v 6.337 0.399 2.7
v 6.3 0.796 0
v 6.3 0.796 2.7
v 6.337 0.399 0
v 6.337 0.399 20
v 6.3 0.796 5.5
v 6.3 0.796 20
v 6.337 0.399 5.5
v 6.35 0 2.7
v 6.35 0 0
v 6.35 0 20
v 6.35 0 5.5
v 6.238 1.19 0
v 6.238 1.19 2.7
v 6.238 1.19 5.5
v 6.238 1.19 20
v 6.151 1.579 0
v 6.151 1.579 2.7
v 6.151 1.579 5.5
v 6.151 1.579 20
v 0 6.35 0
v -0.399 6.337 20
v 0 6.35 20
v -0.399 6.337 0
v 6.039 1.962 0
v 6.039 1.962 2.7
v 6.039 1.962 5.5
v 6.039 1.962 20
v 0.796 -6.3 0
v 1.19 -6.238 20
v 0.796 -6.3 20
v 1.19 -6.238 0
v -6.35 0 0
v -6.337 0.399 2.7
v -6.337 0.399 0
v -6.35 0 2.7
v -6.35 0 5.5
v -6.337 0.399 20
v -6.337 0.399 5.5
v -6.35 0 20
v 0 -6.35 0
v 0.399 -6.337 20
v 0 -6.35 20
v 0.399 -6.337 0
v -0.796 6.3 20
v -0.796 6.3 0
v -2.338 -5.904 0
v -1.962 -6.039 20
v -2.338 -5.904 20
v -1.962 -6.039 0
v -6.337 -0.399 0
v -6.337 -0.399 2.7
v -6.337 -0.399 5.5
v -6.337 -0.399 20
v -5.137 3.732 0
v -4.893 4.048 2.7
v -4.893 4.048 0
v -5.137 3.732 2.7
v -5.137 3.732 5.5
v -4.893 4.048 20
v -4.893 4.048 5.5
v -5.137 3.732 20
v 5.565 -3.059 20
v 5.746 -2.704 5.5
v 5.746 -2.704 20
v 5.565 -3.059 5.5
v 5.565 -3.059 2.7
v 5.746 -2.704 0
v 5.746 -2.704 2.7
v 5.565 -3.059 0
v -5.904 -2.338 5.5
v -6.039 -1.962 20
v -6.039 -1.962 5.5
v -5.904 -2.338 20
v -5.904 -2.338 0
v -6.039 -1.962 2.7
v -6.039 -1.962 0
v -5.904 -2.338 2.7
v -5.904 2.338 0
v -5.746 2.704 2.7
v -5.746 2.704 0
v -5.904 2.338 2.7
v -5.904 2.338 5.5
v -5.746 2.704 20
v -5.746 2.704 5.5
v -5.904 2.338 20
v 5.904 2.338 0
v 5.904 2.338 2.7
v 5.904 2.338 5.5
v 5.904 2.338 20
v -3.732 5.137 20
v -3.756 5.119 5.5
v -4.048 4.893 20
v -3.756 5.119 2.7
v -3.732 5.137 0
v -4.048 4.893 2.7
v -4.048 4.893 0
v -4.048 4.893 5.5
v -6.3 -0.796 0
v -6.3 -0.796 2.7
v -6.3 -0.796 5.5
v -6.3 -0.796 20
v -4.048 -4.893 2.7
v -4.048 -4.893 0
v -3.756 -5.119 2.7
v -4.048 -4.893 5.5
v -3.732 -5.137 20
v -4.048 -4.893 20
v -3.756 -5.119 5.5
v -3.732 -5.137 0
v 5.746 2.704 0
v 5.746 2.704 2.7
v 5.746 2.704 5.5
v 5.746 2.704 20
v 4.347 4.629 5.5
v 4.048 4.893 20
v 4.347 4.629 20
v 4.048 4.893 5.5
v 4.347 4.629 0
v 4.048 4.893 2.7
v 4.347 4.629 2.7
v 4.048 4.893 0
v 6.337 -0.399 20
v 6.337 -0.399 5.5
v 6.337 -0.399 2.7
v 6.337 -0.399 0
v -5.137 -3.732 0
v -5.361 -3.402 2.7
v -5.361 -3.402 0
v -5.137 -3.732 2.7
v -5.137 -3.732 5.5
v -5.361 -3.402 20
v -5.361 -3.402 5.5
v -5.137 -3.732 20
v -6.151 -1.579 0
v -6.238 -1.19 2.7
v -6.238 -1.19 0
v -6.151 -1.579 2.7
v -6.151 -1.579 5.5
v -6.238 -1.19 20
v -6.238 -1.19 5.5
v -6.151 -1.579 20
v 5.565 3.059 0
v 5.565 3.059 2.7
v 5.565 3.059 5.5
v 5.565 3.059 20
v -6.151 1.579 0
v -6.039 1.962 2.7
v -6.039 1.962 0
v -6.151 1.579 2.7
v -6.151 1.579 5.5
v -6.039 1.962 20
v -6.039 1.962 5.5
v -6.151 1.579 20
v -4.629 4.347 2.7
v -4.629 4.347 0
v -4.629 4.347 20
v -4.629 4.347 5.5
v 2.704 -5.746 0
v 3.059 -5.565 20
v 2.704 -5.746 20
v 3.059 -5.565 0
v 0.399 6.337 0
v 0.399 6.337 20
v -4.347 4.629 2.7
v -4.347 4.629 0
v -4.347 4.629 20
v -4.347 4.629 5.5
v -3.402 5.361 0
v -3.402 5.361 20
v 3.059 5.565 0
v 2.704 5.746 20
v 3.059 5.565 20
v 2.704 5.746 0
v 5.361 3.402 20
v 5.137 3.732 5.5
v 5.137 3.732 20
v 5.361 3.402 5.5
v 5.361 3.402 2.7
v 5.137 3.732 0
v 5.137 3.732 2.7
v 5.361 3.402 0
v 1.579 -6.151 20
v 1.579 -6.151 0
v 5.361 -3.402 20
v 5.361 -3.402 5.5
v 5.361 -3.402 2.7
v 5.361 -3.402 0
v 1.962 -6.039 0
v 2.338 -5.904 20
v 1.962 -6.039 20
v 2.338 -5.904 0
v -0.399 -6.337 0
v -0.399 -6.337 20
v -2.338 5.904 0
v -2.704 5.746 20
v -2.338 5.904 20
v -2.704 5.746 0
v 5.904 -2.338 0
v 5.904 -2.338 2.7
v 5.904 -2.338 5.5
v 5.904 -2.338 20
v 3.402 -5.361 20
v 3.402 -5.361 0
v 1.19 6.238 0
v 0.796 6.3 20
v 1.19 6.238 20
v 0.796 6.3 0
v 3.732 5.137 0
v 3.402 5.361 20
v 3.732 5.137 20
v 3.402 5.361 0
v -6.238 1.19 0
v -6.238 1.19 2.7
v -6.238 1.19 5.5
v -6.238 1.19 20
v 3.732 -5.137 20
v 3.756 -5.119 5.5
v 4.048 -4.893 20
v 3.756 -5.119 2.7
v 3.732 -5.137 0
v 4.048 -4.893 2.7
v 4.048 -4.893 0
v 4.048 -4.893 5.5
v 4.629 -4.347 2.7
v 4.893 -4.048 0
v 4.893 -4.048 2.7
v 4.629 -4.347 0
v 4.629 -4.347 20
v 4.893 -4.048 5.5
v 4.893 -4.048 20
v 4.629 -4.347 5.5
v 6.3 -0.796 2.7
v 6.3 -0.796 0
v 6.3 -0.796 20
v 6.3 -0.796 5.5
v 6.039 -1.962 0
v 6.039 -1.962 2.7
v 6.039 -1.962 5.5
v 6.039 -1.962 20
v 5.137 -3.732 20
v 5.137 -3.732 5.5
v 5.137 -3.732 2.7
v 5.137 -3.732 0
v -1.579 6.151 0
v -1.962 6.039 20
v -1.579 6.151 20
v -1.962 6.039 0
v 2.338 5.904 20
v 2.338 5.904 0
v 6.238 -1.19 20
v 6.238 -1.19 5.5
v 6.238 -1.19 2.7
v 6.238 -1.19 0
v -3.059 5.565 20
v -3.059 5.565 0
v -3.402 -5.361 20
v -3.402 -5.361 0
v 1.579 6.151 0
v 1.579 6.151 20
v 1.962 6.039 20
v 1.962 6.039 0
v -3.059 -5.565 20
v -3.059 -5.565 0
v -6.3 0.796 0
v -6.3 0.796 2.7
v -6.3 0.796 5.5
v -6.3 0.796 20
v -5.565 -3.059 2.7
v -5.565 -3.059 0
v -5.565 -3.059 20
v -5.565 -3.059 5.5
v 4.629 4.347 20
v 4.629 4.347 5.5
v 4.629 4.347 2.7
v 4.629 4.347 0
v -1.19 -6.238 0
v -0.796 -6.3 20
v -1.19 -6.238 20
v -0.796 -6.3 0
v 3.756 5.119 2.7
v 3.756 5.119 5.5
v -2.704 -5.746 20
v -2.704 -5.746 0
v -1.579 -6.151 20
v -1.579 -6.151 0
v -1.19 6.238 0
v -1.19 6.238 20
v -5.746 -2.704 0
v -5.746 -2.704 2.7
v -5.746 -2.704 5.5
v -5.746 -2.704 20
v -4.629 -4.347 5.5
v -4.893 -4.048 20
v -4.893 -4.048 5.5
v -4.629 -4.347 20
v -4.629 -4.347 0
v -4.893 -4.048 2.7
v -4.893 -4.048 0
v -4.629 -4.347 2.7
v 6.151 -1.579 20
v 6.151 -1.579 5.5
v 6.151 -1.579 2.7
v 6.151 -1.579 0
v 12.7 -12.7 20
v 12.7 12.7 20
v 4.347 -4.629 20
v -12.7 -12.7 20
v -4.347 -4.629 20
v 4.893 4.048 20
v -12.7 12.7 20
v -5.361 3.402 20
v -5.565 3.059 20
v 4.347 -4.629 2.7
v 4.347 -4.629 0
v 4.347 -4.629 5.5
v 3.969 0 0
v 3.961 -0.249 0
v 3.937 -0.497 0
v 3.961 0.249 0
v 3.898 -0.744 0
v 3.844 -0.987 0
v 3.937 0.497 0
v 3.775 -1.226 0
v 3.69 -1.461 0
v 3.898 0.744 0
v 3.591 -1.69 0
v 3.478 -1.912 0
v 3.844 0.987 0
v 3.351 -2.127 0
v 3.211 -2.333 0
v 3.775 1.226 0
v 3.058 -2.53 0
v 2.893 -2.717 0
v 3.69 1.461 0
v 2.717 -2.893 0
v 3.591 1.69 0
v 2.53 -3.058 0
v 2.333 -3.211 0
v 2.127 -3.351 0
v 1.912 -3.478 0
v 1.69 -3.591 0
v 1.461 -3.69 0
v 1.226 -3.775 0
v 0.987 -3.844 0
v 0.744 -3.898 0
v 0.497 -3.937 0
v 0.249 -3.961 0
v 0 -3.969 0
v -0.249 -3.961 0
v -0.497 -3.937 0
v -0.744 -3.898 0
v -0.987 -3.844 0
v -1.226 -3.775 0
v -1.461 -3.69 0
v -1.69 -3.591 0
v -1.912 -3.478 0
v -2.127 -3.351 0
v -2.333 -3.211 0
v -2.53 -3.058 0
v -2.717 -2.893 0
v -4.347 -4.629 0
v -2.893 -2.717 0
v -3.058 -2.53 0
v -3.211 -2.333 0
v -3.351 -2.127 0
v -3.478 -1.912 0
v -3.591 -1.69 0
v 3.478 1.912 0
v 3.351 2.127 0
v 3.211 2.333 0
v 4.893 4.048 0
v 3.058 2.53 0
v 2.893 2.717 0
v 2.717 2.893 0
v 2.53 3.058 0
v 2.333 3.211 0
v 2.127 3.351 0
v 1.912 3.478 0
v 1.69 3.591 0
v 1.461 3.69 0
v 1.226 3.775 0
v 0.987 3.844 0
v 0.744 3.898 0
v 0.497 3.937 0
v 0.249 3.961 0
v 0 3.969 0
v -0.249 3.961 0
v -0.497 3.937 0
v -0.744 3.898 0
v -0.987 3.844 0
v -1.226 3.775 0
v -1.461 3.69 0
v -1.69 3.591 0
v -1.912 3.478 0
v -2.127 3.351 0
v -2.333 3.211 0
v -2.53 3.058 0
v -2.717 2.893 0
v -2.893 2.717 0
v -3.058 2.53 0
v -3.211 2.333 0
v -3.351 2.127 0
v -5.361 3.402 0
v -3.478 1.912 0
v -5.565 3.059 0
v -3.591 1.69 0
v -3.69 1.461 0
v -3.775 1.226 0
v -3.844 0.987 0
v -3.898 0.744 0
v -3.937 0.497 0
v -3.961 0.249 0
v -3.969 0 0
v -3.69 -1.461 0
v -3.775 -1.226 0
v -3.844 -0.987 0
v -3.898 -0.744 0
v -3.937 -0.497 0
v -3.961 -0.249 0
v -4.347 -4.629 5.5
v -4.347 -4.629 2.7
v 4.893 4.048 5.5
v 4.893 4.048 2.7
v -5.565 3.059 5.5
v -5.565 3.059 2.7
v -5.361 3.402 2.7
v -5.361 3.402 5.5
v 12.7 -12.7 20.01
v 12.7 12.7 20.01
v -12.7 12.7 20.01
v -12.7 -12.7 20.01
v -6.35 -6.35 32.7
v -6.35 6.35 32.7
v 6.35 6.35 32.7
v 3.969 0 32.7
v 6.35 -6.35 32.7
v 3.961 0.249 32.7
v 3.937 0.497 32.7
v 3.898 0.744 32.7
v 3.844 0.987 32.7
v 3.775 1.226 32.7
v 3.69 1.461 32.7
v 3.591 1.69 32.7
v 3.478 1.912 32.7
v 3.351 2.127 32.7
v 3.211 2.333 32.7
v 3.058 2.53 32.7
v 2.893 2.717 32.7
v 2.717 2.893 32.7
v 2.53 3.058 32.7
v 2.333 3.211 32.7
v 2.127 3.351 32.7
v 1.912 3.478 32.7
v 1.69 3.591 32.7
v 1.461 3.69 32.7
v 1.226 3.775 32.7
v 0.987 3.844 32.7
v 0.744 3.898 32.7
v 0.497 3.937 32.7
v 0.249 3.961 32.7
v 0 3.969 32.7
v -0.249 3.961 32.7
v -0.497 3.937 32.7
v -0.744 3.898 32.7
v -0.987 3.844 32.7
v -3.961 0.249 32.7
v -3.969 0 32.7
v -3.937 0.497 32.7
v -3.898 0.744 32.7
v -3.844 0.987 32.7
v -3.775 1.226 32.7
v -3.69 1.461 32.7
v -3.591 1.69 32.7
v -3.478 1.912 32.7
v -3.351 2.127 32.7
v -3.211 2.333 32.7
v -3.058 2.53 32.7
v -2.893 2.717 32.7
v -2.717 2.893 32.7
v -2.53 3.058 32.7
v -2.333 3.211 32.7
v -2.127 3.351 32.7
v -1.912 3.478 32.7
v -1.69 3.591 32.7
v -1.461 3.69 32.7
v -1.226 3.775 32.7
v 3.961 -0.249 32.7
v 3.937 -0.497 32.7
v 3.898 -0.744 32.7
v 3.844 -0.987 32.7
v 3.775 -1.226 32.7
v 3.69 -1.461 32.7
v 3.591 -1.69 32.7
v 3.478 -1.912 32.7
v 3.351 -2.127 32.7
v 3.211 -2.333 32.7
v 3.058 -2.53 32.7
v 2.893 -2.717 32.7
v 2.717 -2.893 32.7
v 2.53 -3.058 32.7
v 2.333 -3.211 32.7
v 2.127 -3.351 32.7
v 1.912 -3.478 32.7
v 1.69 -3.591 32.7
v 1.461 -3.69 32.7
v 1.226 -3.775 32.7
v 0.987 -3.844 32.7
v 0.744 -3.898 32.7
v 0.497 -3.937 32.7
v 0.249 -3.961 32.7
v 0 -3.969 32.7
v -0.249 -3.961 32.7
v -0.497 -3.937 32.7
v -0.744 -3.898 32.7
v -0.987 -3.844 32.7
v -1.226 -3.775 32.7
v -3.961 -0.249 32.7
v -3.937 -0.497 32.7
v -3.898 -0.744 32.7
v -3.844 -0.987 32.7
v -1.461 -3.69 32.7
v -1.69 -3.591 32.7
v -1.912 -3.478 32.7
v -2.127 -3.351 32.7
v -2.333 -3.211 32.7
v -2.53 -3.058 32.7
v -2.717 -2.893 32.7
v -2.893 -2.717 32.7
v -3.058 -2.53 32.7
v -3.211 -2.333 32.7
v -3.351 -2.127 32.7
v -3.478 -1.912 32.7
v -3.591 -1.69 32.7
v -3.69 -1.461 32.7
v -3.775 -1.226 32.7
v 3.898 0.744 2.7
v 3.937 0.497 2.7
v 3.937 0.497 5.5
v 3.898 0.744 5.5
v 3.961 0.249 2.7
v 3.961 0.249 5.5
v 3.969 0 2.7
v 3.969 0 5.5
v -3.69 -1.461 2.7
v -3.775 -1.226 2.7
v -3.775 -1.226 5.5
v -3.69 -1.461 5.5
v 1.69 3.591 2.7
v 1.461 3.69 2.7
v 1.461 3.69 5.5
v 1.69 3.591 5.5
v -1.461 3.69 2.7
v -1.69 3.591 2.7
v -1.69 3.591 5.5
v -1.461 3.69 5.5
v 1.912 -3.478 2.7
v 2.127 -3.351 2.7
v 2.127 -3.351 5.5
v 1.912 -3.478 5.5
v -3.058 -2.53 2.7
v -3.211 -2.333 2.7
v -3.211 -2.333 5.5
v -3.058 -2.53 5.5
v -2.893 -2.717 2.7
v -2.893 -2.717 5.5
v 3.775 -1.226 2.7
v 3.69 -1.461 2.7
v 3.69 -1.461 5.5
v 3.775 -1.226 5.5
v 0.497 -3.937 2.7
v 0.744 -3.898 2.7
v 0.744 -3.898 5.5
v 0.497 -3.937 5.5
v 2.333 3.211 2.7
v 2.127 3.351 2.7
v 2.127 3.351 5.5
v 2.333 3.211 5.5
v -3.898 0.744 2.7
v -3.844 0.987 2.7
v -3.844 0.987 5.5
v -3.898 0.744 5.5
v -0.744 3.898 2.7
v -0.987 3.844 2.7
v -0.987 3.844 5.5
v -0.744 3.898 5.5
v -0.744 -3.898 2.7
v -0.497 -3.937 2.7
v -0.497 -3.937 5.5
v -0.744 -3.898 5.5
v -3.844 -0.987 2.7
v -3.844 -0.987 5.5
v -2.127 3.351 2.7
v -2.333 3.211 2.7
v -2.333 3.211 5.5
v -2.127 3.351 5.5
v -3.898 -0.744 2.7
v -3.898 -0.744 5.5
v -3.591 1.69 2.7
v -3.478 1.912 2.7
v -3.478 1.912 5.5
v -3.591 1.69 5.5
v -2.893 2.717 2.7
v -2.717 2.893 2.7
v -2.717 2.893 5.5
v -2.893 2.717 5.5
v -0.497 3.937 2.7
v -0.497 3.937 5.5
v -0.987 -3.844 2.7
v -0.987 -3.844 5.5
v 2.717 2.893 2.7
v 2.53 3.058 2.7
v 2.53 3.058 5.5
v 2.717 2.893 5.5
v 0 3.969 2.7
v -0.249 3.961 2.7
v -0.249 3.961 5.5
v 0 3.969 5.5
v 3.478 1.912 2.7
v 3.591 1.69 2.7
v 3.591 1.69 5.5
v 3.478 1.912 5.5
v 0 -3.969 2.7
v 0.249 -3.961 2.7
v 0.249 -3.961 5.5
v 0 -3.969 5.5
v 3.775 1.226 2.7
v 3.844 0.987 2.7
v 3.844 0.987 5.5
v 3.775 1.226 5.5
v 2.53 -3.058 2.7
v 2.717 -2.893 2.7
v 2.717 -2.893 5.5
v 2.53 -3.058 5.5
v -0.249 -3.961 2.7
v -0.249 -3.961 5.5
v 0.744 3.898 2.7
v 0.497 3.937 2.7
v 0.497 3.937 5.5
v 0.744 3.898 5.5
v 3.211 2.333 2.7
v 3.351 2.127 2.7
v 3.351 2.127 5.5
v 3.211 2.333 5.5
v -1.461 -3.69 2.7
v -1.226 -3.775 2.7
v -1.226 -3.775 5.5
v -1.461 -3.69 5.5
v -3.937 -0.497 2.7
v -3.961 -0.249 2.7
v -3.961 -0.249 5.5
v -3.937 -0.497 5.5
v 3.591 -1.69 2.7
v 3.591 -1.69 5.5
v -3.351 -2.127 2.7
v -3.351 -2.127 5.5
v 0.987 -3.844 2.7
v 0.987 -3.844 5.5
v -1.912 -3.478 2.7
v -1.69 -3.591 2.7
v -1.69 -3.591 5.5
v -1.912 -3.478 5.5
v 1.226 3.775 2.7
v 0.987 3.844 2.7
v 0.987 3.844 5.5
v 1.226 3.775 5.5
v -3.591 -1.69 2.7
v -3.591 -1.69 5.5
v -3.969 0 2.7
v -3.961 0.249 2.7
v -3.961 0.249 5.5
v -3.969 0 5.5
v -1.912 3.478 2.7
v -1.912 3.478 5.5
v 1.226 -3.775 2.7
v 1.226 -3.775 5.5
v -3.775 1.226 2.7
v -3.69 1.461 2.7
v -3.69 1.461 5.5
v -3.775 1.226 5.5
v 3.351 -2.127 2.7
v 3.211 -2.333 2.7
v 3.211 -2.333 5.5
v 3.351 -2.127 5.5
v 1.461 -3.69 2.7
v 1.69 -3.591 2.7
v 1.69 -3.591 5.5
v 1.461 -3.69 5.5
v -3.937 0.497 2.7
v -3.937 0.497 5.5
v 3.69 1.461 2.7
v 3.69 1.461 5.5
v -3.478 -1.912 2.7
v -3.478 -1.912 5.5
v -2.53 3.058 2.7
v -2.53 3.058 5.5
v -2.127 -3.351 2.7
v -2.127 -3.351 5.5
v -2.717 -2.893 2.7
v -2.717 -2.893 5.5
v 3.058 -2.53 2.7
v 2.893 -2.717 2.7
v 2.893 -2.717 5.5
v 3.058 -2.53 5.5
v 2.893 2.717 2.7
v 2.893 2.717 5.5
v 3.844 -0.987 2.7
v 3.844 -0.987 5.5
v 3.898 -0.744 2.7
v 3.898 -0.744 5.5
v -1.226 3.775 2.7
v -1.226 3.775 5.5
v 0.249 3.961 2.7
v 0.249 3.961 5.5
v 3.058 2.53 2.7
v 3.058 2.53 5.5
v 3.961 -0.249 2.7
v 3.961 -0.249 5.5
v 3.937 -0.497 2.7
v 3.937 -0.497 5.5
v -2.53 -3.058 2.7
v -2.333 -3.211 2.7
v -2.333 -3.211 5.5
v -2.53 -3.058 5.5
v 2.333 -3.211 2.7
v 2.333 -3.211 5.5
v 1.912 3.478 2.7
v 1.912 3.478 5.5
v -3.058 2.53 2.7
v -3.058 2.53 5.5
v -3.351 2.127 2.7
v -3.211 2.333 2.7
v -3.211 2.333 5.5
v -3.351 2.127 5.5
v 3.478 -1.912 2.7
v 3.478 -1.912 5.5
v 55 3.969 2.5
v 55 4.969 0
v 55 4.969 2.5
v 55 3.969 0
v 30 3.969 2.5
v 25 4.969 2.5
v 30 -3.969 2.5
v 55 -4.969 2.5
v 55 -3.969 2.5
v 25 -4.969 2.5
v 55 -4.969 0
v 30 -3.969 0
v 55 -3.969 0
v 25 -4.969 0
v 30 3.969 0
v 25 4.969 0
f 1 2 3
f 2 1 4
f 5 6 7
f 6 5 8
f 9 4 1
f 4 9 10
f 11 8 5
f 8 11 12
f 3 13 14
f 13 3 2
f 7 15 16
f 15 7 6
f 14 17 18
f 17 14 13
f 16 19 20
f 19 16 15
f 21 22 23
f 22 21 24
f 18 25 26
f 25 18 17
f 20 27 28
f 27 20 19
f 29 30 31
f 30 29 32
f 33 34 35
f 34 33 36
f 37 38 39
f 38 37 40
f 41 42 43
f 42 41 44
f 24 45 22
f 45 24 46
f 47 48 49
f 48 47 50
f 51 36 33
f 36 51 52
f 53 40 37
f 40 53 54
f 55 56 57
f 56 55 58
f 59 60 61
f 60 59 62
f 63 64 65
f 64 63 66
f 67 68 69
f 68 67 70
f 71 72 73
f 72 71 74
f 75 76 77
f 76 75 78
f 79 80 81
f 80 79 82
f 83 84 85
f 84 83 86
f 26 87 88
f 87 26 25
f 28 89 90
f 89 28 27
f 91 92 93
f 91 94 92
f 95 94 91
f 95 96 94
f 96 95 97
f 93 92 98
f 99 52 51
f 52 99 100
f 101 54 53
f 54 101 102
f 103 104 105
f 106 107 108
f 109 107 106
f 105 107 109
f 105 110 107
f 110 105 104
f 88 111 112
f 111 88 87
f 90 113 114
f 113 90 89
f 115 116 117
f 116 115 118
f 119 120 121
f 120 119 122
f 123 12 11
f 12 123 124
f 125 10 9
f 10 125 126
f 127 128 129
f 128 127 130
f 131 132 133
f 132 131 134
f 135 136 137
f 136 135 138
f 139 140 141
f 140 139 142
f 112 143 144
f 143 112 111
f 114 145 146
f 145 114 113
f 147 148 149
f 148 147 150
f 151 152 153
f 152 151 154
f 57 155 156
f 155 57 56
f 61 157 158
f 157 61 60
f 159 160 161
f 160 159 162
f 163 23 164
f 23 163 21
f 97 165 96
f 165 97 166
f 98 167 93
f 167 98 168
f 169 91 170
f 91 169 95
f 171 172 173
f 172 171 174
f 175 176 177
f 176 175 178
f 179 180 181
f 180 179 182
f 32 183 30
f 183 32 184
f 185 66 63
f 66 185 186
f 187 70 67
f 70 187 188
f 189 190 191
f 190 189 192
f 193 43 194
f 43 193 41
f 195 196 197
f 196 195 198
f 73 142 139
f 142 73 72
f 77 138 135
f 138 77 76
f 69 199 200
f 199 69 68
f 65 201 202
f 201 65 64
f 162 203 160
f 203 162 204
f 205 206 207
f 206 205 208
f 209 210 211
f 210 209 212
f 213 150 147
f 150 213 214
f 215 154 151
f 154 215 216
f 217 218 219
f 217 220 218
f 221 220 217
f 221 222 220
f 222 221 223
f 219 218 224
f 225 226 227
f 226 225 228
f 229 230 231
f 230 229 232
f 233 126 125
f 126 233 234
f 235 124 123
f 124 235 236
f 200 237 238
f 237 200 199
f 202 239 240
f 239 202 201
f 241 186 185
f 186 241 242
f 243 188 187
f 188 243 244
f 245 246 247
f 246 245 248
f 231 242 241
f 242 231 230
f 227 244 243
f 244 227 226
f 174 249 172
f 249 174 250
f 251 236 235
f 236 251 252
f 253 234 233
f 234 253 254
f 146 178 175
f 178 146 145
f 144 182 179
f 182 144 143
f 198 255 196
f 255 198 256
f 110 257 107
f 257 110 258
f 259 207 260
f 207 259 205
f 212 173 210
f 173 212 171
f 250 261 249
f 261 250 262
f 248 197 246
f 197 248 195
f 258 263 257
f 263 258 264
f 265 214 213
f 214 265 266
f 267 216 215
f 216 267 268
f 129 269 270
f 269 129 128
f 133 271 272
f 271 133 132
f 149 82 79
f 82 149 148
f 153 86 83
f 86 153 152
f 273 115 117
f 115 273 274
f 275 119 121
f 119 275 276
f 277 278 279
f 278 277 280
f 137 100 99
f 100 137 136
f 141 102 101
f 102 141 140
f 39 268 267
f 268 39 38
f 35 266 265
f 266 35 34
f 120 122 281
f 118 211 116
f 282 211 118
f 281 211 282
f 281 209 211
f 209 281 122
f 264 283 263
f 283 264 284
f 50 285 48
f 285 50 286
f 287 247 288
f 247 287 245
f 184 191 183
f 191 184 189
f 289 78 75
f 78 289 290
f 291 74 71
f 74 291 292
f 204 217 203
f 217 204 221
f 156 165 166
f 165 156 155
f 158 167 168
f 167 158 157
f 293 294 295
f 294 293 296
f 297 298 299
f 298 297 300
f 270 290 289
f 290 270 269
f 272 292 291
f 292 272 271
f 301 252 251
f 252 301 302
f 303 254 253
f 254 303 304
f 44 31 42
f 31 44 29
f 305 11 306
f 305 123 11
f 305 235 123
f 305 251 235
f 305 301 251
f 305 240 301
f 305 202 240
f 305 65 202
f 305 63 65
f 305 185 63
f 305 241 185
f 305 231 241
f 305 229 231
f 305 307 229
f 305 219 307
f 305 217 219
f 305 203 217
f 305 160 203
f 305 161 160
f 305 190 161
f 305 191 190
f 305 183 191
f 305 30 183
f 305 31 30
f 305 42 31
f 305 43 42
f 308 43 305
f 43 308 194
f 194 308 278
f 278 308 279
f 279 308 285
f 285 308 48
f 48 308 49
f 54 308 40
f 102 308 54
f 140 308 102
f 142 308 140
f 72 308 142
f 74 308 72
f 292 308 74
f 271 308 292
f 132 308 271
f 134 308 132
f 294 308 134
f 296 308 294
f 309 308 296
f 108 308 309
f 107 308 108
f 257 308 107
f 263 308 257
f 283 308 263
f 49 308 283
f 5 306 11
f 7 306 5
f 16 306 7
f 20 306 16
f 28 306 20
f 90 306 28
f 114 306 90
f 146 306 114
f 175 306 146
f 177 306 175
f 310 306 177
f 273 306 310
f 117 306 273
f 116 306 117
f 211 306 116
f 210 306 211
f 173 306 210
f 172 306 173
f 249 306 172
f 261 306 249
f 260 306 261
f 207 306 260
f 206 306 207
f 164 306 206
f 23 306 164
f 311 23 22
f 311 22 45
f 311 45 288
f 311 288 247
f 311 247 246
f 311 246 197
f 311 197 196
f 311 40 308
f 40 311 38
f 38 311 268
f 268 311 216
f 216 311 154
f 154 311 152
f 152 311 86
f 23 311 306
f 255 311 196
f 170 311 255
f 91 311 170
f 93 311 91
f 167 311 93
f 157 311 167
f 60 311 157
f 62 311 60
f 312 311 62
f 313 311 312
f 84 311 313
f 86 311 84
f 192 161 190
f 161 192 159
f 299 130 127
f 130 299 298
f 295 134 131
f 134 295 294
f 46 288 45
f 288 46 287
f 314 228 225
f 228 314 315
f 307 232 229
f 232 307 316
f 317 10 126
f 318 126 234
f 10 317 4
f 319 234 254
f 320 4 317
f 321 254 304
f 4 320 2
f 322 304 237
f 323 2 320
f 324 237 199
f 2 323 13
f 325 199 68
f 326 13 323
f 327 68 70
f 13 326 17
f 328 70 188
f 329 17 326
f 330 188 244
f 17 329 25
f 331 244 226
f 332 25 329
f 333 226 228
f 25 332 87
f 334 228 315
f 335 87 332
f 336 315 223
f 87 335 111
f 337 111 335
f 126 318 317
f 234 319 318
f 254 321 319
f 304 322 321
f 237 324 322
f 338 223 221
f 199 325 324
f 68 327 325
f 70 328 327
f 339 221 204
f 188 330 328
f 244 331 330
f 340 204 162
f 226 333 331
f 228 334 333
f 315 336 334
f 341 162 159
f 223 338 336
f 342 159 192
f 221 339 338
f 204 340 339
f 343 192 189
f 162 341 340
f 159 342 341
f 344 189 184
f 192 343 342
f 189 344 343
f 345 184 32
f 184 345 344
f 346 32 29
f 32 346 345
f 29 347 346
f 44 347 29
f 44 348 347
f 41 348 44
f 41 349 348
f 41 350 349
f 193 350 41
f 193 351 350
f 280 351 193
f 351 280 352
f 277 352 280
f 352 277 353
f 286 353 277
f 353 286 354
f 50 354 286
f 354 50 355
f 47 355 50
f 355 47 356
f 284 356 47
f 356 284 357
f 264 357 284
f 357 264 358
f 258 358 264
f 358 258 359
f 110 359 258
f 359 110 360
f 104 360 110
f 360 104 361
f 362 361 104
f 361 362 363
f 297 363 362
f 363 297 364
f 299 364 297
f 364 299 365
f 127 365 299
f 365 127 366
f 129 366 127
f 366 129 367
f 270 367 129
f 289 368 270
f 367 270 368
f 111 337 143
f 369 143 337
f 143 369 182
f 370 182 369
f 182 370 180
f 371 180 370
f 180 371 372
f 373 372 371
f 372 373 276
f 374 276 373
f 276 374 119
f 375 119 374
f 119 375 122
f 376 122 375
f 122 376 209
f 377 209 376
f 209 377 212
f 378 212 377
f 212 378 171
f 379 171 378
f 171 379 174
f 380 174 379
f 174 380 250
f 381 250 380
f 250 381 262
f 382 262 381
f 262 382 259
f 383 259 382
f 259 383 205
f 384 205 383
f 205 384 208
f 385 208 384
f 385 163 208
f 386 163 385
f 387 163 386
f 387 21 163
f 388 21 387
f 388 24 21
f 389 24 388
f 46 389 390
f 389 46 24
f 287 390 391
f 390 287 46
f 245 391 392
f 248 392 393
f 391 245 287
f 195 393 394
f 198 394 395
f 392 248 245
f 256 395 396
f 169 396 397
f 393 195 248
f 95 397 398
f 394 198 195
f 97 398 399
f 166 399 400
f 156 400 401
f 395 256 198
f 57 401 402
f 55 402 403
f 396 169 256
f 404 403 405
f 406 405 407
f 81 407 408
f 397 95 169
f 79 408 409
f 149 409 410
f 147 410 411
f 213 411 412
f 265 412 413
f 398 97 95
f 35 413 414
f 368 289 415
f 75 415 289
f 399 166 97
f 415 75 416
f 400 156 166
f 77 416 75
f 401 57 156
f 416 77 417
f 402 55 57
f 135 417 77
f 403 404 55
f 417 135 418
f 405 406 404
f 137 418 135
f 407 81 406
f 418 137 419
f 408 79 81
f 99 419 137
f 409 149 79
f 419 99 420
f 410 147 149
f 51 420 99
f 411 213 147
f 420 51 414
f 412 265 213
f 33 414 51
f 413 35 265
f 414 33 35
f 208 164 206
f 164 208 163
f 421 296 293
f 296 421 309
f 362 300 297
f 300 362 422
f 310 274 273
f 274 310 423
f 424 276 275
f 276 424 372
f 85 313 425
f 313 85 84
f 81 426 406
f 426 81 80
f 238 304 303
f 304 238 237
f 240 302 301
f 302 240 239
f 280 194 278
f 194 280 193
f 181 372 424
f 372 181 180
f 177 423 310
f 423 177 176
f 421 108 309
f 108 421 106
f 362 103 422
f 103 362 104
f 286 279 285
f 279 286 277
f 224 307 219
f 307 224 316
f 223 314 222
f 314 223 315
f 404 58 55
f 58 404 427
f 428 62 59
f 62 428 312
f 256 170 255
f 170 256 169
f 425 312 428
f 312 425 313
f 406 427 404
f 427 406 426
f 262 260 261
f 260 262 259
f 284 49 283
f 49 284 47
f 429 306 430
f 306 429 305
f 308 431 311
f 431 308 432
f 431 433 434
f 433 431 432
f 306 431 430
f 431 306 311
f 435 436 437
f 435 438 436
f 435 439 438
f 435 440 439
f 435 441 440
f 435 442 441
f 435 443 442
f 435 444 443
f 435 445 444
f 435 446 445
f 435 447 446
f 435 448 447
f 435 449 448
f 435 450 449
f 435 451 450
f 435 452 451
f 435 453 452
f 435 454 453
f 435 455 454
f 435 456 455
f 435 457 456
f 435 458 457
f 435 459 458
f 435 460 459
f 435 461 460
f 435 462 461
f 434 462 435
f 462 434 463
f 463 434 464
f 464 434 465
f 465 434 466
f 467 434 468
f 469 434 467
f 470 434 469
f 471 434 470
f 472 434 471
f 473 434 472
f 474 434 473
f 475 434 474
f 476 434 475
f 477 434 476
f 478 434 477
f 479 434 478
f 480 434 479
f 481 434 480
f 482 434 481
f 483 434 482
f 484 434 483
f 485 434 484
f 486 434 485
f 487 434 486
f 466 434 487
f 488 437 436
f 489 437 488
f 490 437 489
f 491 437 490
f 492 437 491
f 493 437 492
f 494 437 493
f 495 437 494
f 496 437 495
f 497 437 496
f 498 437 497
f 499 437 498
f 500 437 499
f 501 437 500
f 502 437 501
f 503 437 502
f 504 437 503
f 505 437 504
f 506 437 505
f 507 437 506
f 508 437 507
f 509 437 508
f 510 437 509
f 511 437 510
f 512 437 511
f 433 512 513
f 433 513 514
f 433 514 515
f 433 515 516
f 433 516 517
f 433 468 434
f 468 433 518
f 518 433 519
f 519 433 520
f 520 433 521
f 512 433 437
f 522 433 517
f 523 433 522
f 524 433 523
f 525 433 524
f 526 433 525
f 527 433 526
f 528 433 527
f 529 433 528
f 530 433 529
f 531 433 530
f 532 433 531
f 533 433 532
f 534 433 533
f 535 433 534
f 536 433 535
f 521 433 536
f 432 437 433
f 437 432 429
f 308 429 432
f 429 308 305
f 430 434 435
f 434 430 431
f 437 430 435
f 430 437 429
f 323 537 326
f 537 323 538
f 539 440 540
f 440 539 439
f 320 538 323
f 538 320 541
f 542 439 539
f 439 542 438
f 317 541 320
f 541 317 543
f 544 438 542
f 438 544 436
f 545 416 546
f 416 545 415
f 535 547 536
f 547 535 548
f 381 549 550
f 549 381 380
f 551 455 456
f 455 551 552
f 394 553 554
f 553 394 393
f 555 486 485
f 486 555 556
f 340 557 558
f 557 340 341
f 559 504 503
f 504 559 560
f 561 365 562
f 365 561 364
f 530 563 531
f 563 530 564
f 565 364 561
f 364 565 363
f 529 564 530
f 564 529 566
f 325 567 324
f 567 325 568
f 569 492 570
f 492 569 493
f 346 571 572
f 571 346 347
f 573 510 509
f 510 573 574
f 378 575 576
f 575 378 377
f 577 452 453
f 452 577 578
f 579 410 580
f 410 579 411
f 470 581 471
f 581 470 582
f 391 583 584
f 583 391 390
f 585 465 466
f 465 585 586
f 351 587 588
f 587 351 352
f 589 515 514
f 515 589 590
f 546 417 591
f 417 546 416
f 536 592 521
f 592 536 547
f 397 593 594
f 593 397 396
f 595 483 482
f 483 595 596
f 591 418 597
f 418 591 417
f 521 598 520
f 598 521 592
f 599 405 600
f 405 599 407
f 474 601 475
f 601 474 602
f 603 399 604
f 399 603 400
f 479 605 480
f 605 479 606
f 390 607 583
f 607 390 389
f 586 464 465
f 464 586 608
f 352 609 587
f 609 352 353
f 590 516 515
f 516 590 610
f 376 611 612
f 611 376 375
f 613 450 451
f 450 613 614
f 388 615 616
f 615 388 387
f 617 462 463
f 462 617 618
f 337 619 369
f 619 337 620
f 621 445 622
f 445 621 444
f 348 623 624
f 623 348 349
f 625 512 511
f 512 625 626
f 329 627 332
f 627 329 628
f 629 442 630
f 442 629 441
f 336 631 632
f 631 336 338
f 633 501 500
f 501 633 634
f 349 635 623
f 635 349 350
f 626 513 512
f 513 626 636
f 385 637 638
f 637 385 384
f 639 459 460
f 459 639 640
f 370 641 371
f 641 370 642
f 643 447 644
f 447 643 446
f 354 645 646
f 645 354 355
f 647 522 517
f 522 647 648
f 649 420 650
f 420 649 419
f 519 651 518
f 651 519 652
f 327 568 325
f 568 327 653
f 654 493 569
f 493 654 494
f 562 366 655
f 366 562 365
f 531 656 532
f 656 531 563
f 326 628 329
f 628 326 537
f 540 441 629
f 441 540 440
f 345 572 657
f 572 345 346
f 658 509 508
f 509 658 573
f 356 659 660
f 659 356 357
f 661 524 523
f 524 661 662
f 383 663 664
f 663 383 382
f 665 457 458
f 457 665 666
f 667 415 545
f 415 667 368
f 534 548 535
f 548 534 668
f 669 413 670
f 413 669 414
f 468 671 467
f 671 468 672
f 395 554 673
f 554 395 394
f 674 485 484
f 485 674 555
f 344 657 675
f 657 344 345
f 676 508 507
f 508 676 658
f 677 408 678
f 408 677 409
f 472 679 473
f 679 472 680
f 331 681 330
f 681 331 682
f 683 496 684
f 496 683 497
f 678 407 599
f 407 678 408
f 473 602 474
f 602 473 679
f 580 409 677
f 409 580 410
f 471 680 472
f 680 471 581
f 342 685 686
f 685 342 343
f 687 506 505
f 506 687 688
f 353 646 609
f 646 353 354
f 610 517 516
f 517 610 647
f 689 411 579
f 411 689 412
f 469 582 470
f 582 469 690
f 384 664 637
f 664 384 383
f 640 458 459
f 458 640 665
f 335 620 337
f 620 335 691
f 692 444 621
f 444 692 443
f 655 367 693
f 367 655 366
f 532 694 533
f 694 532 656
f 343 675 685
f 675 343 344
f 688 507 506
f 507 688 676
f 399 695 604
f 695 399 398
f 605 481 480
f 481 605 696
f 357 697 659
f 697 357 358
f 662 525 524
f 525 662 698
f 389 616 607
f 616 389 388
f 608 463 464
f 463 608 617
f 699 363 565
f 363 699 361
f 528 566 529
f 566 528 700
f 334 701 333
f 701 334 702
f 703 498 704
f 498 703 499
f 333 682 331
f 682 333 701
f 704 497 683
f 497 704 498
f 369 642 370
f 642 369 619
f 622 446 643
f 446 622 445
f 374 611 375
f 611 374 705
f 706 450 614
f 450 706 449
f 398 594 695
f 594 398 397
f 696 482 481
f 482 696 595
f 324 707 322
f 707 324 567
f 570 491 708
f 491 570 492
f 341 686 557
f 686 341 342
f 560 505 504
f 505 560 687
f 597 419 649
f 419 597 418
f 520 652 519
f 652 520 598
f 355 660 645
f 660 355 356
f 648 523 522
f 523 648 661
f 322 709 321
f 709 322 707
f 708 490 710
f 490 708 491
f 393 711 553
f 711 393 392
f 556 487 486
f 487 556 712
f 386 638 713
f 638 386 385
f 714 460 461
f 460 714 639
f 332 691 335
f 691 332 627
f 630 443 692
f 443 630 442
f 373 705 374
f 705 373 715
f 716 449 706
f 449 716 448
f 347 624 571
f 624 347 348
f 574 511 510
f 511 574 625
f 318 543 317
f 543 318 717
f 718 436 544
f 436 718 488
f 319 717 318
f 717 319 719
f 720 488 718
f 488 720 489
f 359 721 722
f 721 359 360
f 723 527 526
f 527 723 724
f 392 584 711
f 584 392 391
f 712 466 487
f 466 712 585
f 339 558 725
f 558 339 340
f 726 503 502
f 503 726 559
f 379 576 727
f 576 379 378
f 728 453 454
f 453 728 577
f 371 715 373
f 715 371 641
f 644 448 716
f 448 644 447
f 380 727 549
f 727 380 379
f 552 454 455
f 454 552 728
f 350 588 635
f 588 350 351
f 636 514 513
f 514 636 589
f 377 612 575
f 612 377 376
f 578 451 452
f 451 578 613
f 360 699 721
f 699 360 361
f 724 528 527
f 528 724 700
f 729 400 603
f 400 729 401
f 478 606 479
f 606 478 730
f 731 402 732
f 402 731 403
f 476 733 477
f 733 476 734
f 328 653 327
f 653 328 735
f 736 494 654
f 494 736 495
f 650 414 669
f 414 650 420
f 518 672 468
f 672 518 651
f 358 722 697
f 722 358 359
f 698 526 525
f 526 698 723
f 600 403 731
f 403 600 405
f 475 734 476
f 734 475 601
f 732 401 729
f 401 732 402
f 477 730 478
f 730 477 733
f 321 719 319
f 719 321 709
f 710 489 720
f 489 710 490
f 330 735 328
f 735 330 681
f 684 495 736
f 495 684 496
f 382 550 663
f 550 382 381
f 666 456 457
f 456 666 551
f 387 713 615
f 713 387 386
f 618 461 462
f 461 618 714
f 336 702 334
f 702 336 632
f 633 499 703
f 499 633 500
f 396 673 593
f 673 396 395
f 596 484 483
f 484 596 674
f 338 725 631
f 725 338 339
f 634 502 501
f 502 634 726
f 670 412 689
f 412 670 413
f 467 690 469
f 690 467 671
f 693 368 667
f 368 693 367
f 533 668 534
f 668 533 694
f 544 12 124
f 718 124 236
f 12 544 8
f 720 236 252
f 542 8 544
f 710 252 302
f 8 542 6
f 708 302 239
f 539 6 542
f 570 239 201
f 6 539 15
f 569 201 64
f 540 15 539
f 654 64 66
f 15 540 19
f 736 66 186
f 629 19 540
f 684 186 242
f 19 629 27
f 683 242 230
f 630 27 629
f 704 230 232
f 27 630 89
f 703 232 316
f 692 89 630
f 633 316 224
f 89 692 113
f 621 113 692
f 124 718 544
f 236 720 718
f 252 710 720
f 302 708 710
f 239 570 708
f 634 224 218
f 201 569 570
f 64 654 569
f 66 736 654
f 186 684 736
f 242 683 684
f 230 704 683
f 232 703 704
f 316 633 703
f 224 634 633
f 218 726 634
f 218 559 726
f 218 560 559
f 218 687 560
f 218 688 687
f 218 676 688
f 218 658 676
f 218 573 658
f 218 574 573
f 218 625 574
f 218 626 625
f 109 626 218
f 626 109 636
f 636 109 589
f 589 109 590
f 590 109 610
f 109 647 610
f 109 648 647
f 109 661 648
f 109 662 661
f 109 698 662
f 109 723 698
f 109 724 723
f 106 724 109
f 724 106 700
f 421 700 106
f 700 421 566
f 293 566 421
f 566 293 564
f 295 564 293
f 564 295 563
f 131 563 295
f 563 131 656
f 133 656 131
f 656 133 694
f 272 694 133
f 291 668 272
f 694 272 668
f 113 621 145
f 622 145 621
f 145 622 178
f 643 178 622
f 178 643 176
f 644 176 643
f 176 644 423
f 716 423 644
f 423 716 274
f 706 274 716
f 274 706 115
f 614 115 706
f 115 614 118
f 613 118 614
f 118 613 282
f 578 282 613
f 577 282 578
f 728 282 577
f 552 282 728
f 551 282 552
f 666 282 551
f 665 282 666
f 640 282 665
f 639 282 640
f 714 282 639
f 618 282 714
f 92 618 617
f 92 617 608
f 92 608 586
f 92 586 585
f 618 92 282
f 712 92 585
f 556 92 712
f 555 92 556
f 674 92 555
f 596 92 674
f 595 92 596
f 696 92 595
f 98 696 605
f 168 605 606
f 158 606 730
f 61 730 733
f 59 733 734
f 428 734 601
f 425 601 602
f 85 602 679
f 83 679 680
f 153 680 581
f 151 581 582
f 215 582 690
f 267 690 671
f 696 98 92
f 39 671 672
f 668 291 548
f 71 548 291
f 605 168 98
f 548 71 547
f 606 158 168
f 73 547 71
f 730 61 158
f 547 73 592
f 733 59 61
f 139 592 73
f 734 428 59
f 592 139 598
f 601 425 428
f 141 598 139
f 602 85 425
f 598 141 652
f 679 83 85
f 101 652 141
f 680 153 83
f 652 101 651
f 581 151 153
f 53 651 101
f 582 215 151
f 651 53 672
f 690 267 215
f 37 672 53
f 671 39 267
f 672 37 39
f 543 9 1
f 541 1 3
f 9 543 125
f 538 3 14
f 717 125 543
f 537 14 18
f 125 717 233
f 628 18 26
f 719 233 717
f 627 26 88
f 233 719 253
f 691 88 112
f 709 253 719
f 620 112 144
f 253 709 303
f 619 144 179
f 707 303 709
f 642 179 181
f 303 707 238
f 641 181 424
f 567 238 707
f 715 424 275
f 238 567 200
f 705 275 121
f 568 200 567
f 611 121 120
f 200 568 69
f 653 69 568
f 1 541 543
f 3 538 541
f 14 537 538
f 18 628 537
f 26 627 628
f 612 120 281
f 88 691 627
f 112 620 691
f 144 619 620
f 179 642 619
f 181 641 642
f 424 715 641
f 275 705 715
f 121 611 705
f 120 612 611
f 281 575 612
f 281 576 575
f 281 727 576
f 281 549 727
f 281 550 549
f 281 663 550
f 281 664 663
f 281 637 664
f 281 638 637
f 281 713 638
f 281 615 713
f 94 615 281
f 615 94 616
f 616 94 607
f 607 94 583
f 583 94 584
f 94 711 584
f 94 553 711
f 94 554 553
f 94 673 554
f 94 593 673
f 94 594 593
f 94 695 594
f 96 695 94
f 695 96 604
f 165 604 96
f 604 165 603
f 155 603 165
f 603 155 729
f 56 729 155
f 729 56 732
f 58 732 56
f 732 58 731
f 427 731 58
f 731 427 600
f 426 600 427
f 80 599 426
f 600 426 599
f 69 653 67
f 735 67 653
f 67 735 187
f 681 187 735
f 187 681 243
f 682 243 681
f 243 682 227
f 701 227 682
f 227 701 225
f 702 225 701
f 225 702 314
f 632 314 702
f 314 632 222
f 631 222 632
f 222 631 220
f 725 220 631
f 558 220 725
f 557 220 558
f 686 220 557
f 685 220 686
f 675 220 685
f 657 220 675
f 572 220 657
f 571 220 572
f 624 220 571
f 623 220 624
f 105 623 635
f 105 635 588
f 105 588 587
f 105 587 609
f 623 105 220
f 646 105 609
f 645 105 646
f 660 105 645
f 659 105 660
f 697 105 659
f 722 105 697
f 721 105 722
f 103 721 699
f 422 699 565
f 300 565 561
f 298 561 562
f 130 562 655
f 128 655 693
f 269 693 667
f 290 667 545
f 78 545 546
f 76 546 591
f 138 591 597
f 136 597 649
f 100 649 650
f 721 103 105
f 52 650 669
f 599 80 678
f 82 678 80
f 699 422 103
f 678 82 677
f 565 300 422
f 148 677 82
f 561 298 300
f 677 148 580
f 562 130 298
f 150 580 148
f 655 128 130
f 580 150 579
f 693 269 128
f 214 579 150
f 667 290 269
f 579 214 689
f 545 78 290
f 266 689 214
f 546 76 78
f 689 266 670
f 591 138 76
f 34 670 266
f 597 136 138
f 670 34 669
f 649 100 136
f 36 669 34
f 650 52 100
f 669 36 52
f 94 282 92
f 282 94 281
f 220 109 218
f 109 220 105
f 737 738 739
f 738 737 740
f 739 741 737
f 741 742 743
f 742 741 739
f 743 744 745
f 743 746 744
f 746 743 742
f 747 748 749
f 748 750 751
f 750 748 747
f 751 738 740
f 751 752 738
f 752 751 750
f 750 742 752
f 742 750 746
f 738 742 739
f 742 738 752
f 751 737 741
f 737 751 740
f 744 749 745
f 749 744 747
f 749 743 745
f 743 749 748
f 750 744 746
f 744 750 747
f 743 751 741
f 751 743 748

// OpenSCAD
// Tubing Port

tubing_od = 5/16 * 25.4;   // 5/16" = 7.9375mm
cyl_od = 1/2 * 25.4;       // 1/2" = 12.7mm
cyl_h = 20;

frustum_bot_side = 1 * 25.4;        // 1" = 25.4mm
frustum_top_side = 1/2 * 25.4;      // 1/2" = 12.7mm
frustum_h = 1/2 * 25.4;             // 1/2" = 12.7mm

// U-clip parameters
clip_arm_w = 1;                    // width of each arm (Y)
clip_thickness = 2.5;                  // height of arms (Z)
clip_gap = tubing_od;  // inner gap, at least 5/16" clearance
clip_length = 30;                    // total arm length (X)
clip_bridge = 5;                     // bridge width at closed end (X)
clip_y_total = clip_arm_w * 2 + clip_gap;

slot_top_z = cyl_h - 14.5;              // top of slot 14.5mm below frustum base
slot_tol = 0.3;

module u_clip() {
    // Arm 1
    translate([-clip_length/2, clip_gap/2, 0])
        cube([clip_length, clip_arm_w, clip_thickness]);
    // Arm 2
    translate([-clip_length/2, -clip_gap/2 - clip_arm_w, 0])
        cube([clip_length, clip_arm_w, clip_thickness]);
    // Bridge (closed end of U)
    translate([-clip_length/2, -clip_gap/2 - clip_arm_w, 0])
        cube([clip_bridge, clip_y_total, clip_thickness]);
}

// Main piece with slot
difference() {
    union() {
        // Cylinder
        cylinder(d=cyl_od, h=cyl_h, $fn=100);

        // Square pyramid frustum on top
        translate([0, 0, cyl_h])
            hull() {
                translate([0, 0, 0.005])
                    cube([frustum_bot_side, frustum_bot_side, 0.01], center=true);
                translate([0, 0, frustum_h - 0.005])
                    cube([frustum_top_side, frustum_top_side, 0.01], center=true);
            }
    }

    // 5/16" through hole for tubing
    translate([0, 0, -0.05])
        cylinder(d=tubing_od, h=cyl_h + frustum_h + 0.1, $fn=100);

    // Slot for U-clip
    translate([0, 0, slot_top_z - (clip_thickness + slot_tol)/2])
        cube([clip_length, clip_y_total + slot_tol, clip_thickness + slot_tol], center=true);
}

// U-clip for separate printing (shown offset to the side)
translate([40, 0, 0])
    u_clip();
